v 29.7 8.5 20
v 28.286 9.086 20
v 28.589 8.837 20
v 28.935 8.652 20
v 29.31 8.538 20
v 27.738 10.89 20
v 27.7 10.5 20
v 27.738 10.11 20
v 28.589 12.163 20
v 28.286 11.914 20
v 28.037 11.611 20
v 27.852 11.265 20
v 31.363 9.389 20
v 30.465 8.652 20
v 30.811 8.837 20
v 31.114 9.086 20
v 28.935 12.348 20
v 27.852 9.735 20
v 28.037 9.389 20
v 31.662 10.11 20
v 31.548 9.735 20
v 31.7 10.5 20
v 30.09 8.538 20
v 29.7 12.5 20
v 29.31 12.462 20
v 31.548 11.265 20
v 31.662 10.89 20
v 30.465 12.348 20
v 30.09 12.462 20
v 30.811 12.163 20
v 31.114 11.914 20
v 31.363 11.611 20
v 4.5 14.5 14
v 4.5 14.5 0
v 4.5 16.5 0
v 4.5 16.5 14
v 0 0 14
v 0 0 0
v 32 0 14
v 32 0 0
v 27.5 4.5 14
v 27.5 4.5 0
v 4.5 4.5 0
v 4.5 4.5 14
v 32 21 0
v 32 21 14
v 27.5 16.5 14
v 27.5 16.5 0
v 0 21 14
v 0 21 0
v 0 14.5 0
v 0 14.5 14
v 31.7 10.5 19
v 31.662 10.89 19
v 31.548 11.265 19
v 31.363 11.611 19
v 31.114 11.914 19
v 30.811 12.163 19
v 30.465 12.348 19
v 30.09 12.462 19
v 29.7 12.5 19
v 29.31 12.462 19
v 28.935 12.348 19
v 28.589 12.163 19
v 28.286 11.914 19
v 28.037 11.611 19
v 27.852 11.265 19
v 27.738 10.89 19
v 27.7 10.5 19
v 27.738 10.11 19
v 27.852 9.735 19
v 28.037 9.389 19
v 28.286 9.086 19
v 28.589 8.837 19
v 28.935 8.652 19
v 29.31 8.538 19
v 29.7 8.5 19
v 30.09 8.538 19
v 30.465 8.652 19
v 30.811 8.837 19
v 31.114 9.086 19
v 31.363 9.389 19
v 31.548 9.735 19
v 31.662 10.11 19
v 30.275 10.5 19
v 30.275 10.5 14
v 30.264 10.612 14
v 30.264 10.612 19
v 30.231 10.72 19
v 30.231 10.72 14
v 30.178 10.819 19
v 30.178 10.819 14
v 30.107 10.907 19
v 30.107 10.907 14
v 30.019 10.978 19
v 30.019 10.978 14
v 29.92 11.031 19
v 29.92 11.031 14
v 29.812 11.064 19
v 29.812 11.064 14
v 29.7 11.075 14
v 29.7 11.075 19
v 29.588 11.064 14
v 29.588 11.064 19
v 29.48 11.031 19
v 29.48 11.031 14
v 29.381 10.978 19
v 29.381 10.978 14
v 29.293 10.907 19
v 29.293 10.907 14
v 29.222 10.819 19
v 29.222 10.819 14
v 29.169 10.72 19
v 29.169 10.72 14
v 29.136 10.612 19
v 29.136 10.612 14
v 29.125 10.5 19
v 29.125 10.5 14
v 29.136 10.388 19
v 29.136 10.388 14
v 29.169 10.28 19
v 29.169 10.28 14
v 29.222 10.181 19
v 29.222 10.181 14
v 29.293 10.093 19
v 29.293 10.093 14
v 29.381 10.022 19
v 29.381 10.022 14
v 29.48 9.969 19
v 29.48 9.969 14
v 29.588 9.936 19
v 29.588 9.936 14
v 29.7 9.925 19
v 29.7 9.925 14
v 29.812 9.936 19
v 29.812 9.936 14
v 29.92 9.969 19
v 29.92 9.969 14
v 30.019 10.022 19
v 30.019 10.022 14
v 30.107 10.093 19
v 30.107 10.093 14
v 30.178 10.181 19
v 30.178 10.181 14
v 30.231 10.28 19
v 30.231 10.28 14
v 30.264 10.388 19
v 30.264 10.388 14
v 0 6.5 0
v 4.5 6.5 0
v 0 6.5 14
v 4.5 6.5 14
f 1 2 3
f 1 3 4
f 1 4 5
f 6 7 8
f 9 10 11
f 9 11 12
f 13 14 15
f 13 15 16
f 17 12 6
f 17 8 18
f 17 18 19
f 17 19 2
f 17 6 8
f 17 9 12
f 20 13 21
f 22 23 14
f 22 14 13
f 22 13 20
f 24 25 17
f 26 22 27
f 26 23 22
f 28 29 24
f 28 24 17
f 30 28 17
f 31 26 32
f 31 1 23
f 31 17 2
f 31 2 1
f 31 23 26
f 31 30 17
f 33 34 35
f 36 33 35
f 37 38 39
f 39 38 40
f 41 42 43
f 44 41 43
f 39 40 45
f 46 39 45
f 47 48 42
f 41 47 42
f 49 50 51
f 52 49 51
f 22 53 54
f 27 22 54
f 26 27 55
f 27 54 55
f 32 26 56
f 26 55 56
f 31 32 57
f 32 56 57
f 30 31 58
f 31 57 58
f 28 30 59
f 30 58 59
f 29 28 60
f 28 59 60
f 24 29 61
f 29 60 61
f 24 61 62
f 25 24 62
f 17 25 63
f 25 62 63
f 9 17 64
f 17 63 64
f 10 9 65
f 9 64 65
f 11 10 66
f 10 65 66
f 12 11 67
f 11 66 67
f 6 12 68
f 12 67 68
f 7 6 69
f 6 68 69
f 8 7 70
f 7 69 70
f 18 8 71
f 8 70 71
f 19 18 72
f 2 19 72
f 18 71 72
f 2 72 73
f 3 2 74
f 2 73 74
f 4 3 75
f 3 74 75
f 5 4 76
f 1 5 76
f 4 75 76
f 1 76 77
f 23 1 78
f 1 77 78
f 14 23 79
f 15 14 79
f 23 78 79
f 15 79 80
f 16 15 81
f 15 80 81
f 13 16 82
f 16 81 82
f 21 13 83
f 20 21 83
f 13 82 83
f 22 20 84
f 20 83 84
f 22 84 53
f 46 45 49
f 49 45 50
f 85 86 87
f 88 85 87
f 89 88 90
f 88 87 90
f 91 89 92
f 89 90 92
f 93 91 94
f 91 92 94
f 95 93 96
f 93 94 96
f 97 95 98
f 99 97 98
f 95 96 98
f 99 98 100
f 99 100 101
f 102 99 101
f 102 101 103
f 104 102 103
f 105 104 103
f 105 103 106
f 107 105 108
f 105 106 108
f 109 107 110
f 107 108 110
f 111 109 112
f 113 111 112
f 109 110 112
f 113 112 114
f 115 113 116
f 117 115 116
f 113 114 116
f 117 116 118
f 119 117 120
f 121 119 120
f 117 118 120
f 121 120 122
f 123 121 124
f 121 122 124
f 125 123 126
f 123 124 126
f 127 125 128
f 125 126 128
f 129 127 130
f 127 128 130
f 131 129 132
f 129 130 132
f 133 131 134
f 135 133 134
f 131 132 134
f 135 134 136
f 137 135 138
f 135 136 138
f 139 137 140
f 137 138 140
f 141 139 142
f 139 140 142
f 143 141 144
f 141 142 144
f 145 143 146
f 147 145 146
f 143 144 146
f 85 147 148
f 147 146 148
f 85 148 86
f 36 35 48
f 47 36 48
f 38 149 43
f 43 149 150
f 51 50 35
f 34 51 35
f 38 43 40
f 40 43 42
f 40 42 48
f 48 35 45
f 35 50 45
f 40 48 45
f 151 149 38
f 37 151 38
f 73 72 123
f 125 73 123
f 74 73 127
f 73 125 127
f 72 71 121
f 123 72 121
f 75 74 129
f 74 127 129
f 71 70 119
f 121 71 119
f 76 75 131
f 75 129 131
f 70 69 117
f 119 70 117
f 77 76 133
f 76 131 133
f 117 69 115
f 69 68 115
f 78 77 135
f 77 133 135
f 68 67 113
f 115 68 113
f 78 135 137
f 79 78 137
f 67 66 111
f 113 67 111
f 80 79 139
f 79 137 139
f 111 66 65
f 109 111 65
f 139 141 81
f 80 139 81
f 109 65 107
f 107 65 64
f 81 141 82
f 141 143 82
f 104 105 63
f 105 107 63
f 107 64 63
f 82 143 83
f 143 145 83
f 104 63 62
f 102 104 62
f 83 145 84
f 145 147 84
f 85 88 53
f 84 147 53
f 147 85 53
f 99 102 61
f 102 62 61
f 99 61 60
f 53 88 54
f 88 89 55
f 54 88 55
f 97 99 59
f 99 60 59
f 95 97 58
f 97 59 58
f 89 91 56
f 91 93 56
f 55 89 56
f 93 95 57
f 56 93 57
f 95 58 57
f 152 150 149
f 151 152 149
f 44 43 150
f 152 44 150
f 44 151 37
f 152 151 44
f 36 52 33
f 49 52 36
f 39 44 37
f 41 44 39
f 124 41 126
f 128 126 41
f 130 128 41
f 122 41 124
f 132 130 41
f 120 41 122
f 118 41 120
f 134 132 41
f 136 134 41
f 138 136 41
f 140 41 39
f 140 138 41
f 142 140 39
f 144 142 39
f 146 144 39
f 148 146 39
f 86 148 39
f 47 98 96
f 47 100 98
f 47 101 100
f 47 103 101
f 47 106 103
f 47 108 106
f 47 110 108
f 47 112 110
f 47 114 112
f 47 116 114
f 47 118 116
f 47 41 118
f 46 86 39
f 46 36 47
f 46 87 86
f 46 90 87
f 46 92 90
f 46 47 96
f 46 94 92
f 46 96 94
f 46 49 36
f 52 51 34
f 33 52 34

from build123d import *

# Parameters (mm, degrees)
BOSS_EXTRUDE3_DEPTH = 14
SKETCH4_R           = 0.575
BOSS_EXTRUDE4_DEPTH = 5
SKETCH5_R           = 2
BOSS_EXTRUDE5_DEPTH = 1


with BuildPart() as part:
    # Sketch1 → Boss-Extrude3 (new body)
    with BuildSketch(Plane.XY):
        Polygon((0, 0), (32, 0), (32, 21), (0, 21), (0, 14.5), (4.5, 14.5), (4.5, 16.5), (27.5, 16.5), (27.5, 4.5), (4.5, 4.5), (4.5, 6.5), (0, 6.5), align=None)
    extrude(amount=BOSS_EXTRUDE3_DEPTH)

    # Sketch4 → Boss-Extrude4 (add)
    with BuildSketch(Plane.XY.offset(14)):
        with Locations((29.7, 10.5)):
            Circle(SKETCH4_R)
    extrude(amount=BOSS_EXTRUDE4_DEPTH)

    # Sketch5 → Boss-Extrude5 (add)
    with BuildSketch(Plane.XY.offset(19)):
        with Locations((29.7, 10.5)):
            Circle(SKETCH5_R)
    extrude(amount=BOSS_EXTRUDE5_DEPTH)


solid = part.part
